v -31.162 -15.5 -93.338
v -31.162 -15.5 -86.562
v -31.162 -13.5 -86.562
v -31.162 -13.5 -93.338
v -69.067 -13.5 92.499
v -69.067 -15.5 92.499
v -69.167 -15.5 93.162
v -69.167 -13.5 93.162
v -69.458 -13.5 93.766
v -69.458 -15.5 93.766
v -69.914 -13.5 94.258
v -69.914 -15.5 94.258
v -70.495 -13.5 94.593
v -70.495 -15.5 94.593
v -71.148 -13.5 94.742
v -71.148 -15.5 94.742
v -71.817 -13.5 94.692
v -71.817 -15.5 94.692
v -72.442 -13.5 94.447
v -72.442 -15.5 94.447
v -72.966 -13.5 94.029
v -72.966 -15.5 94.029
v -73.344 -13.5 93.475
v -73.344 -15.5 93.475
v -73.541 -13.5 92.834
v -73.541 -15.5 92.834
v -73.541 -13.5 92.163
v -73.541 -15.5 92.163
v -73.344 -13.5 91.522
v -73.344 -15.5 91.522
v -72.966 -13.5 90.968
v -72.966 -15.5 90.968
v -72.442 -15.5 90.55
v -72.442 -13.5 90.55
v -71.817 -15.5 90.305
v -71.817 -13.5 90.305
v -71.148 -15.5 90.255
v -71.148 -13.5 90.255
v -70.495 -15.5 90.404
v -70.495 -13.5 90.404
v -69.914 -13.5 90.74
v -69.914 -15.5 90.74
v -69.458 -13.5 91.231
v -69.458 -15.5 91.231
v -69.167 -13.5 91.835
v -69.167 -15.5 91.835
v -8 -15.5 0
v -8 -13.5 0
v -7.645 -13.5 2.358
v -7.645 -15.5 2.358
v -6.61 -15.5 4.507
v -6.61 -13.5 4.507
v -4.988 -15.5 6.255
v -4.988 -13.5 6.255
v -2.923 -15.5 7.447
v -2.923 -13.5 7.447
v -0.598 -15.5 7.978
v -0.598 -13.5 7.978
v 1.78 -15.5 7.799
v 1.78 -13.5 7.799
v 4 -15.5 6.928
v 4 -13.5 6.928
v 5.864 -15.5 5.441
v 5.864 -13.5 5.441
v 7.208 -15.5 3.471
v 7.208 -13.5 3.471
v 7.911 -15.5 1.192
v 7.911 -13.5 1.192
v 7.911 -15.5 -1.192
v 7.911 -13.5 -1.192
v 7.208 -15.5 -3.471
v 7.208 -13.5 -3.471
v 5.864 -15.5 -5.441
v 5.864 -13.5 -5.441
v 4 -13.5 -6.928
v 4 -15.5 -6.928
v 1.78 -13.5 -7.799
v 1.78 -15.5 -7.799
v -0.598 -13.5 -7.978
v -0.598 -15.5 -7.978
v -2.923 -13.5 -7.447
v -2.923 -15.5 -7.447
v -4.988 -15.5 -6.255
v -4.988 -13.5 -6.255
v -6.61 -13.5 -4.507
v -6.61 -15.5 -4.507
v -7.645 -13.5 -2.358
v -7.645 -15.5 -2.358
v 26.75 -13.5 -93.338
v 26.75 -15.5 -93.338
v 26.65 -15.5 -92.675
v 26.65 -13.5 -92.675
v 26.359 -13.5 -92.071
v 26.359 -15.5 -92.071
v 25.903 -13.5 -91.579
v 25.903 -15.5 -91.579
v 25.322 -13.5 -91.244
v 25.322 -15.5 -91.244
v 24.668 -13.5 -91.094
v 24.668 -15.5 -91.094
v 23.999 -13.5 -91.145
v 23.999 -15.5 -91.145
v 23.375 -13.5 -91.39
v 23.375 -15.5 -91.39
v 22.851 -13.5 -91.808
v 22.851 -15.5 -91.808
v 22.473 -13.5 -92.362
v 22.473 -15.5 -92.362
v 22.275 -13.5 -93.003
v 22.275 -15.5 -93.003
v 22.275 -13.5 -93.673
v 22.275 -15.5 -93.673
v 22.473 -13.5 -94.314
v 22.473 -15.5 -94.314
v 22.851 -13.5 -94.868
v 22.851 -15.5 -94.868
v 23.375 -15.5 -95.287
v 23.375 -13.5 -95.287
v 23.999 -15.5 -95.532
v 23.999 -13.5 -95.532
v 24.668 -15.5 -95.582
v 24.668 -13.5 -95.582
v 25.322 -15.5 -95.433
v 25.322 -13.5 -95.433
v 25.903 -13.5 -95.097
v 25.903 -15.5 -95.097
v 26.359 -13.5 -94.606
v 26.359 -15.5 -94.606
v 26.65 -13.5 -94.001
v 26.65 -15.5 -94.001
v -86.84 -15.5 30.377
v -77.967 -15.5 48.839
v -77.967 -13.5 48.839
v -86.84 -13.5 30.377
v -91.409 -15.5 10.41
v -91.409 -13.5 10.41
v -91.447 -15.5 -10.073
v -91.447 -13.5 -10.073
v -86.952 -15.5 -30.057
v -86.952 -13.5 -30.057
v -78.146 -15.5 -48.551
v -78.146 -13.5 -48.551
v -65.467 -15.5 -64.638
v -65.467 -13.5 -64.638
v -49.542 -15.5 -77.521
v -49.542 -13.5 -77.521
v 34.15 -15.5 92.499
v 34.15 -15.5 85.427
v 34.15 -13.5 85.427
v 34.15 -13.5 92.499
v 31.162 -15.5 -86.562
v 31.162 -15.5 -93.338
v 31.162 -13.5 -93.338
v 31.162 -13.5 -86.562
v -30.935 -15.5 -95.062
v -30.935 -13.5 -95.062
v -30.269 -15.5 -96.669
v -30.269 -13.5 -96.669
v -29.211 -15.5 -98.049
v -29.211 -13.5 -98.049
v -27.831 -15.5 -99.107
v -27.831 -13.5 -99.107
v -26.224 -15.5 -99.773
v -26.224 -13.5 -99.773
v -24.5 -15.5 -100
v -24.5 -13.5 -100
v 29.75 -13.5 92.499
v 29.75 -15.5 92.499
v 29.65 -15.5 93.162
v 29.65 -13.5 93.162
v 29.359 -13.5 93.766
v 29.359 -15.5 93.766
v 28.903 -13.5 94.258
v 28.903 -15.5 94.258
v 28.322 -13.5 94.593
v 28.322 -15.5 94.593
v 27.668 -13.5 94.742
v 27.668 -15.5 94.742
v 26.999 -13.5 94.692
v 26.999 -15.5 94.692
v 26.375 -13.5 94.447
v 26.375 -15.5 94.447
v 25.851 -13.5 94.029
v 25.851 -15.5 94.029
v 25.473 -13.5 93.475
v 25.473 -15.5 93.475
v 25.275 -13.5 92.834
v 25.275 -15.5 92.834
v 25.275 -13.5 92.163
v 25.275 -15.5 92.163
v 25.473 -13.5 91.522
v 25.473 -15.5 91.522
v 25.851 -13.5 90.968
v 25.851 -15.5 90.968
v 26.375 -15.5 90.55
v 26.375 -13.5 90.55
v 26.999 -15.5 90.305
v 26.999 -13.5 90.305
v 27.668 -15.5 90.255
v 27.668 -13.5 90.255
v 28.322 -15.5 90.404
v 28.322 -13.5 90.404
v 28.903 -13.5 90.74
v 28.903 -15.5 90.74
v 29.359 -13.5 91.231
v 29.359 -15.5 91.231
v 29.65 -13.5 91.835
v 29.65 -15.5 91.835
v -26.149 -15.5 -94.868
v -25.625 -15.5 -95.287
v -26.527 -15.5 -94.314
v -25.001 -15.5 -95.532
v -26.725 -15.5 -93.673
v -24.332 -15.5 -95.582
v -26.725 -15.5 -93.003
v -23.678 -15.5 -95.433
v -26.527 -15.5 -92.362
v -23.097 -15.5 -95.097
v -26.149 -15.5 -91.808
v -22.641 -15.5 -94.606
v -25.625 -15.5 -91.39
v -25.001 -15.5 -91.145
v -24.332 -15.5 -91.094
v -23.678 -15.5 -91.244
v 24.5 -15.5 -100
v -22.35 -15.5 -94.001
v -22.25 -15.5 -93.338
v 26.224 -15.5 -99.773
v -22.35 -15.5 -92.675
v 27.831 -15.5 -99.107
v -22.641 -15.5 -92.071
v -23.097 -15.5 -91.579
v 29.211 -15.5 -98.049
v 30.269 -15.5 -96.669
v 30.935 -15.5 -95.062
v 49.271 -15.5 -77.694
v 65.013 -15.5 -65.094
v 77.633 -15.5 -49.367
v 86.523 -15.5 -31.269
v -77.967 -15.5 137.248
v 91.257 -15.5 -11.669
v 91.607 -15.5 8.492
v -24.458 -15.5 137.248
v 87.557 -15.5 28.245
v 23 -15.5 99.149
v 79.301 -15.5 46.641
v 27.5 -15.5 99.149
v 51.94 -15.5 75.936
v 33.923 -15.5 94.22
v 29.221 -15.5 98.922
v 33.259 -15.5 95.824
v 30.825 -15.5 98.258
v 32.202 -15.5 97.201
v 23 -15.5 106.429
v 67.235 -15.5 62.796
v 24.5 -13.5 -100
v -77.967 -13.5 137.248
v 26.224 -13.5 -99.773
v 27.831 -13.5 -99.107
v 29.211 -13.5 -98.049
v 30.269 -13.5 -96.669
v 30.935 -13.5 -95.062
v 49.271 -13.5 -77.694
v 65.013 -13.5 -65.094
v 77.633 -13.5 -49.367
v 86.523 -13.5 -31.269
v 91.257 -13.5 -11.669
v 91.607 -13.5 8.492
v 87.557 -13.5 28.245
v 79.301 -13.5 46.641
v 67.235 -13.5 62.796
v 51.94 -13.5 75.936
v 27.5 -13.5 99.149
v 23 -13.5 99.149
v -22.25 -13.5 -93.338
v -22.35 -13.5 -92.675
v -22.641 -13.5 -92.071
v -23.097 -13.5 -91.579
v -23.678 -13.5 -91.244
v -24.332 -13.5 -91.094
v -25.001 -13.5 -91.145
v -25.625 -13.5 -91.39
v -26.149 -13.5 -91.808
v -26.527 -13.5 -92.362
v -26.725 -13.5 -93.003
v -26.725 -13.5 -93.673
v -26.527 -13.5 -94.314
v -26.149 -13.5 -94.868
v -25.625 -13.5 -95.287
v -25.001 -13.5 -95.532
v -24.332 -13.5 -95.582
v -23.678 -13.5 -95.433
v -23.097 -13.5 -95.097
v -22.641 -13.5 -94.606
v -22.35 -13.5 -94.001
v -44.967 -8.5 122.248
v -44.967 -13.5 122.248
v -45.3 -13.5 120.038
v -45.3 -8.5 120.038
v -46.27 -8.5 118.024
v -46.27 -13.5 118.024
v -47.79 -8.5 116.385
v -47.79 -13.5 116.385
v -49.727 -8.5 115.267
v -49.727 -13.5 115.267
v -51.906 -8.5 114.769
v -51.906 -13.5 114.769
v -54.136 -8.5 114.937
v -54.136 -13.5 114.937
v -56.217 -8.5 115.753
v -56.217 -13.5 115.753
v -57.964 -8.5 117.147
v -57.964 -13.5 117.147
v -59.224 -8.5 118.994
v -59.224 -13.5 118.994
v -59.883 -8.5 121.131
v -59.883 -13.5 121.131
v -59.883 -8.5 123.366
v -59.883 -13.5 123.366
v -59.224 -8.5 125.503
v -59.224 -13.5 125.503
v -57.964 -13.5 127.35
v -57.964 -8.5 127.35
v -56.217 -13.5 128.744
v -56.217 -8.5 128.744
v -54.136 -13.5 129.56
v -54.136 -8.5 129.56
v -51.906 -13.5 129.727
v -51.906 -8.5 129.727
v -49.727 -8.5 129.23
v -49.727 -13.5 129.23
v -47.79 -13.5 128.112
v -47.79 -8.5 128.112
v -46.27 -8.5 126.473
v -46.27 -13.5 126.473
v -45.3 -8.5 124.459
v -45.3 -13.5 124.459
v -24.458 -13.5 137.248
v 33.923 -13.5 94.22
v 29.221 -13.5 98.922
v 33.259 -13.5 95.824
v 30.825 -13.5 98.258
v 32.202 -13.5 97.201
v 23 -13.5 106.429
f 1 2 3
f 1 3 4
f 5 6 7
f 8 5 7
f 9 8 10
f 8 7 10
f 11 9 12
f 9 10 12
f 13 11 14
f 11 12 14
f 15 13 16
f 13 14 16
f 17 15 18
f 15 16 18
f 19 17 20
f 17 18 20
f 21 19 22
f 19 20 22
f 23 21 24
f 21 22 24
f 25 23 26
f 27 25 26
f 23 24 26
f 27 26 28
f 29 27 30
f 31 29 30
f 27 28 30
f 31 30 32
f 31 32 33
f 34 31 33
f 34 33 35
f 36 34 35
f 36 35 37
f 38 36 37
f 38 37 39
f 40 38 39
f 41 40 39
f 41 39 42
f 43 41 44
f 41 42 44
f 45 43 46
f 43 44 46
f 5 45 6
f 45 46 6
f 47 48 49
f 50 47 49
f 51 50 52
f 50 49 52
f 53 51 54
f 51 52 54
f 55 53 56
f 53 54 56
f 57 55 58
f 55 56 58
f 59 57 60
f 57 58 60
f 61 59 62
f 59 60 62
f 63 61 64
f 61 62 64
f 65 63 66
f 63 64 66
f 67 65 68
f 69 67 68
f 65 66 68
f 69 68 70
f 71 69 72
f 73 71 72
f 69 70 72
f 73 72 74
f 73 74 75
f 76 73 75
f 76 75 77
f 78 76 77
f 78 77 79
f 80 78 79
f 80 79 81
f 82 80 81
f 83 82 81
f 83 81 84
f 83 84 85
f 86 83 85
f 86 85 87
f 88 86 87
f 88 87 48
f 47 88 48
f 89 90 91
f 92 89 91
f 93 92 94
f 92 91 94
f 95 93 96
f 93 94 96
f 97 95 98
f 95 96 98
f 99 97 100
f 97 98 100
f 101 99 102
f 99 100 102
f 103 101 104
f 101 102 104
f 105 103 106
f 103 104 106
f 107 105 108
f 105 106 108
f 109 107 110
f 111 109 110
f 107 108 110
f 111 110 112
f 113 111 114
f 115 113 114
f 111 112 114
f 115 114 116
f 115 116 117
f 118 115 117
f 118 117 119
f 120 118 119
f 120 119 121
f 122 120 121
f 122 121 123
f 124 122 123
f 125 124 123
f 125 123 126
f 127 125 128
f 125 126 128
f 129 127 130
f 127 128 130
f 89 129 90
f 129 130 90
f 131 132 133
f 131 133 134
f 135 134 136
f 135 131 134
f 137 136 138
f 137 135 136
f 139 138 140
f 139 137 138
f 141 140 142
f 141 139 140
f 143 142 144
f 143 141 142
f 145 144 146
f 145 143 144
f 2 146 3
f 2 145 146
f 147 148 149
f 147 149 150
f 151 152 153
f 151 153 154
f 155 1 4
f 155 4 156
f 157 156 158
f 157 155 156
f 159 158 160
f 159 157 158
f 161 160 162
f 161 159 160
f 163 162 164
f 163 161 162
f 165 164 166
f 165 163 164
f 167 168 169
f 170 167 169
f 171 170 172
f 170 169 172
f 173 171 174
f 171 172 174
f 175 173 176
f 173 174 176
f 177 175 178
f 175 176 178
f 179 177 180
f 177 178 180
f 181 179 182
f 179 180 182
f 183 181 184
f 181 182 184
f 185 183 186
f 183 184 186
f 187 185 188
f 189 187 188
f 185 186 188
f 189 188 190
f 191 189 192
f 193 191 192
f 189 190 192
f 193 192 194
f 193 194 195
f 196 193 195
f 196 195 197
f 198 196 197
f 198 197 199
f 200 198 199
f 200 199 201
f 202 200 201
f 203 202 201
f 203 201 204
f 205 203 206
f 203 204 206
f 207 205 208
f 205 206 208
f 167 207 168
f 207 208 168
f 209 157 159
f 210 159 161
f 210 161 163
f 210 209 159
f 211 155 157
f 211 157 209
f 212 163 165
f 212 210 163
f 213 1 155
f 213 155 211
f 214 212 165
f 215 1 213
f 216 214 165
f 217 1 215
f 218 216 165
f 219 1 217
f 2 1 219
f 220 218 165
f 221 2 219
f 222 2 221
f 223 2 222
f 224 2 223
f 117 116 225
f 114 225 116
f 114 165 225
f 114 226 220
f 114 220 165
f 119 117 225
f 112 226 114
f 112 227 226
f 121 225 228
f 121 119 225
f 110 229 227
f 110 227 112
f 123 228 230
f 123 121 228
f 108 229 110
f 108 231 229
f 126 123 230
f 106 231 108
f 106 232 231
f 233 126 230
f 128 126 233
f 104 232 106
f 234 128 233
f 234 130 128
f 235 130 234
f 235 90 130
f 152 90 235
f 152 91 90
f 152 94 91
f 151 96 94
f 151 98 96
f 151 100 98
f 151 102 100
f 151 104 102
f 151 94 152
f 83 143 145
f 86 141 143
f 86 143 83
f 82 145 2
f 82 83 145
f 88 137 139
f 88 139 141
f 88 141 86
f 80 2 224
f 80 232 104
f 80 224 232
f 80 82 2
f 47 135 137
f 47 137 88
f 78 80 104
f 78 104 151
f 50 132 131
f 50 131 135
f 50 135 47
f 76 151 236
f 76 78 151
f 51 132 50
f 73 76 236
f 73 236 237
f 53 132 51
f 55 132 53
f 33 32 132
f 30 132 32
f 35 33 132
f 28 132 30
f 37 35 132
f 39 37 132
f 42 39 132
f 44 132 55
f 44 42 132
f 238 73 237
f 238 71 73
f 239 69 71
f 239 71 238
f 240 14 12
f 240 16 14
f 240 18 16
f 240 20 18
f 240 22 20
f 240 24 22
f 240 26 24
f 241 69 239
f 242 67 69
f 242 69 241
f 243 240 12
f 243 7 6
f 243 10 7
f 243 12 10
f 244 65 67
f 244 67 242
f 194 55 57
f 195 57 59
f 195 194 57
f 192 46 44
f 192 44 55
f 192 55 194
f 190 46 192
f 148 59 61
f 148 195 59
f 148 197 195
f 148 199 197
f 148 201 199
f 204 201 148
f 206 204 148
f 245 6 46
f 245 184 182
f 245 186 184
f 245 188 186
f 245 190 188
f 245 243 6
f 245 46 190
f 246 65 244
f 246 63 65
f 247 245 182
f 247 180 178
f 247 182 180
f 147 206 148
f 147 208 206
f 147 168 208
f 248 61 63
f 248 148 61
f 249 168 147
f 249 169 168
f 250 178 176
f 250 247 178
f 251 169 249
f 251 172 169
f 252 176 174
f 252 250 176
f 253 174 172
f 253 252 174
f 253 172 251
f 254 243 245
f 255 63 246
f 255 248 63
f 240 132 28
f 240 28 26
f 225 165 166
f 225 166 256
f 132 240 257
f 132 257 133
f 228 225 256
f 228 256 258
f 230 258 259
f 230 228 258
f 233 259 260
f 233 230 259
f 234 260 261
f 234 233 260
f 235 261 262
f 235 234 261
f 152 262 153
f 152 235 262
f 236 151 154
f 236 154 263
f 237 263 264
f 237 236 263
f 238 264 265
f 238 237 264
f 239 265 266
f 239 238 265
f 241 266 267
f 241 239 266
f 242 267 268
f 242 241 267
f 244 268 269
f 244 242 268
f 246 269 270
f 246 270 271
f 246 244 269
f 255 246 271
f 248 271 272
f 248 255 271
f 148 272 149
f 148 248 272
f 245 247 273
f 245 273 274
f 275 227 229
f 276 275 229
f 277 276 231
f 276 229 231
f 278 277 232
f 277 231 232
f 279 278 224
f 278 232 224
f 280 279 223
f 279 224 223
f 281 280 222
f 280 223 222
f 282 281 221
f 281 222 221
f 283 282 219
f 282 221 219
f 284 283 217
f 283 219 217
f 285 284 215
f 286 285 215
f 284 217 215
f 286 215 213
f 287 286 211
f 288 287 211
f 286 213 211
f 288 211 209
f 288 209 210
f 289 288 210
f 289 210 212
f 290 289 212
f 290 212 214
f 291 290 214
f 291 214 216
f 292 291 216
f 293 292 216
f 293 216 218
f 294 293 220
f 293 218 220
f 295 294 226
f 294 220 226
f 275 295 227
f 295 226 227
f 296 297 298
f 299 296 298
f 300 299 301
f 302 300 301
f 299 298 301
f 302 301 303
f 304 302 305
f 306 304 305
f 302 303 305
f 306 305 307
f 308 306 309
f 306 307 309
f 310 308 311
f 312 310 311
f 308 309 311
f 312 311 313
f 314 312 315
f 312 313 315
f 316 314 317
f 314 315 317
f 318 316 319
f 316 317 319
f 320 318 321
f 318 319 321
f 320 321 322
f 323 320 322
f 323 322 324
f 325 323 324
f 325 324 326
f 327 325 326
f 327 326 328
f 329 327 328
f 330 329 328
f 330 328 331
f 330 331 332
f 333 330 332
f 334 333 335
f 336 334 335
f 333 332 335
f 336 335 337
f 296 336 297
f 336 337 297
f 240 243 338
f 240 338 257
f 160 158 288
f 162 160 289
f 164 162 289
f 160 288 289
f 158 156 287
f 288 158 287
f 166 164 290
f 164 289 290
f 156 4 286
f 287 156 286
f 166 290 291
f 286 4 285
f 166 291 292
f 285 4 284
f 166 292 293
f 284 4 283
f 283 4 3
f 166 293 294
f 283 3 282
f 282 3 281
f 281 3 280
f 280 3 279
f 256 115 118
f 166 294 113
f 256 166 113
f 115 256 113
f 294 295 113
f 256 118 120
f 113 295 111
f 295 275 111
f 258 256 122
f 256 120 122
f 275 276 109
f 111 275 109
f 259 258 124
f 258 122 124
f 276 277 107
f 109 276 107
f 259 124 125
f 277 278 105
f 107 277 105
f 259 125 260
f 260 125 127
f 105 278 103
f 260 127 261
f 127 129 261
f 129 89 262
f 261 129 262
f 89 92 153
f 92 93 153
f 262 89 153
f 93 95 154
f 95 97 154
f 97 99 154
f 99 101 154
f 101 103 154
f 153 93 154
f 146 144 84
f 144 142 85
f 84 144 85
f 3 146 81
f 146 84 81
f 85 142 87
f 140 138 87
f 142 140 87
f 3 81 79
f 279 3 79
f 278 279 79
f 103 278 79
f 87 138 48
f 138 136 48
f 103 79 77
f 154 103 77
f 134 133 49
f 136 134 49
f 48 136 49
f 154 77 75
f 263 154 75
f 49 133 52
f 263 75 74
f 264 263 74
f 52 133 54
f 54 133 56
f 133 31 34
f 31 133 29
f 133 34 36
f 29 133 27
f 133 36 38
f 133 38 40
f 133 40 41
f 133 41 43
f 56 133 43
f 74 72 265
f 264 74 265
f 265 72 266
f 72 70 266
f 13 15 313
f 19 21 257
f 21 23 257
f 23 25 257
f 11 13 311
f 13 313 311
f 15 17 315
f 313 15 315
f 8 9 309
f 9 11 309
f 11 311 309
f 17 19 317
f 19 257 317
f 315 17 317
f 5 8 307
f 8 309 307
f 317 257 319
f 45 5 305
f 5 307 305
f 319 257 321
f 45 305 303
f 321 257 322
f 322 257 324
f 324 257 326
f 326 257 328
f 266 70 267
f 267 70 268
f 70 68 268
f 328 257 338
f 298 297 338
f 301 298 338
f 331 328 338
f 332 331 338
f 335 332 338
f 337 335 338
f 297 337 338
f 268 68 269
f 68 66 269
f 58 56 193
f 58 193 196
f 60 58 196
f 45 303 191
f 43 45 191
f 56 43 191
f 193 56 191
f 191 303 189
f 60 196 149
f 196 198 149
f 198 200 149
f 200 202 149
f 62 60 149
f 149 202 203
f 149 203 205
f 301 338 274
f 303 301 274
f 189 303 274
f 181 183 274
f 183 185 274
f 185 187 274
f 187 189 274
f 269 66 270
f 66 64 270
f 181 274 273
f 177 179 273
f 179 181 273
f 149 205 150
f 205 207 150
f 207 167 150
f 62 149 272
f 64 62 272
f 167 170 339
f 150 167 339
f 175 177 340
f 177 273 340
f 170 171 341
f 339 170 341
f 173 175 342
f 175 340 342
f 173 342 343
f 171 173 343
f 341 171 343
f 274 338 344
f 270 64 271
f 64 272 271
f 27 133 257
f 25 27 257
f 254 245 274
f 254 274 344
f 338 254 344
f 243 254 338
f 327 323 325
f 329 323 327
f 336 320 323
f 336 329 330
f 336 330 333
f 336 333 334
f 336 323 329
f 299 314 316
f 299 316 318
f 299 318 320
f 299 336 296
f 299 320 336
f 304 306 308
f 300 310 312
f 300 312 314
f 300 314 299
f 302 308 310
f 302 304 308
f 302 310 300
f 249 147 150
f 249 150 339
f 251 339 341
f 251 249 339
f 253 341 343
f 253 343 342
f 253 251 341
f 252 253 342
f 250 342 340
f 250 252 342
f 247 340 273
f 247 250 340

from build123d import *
from build123d.topology import SkipClean

# Parameters (mm, degrees)
SALIENTE_EXTRUIR1_DEPTH                   = 12.5
SALIENTE_EXTRUIR1_2_DEPTH                 = 12.5
CROQUIS4_R                                = 92
CROQUIS4_R_2                              = 17.5
SALIENTE_EXTRUIR3_DEPTH                   = 3
CROQUIS5_W                                = 42.3
CROQUIS5_H                                = 42.3
CROQUIS5_R                                = 19
CROQUIS5_R_2                              = 1.5
SALIENTE_EXTRUIR4_DEPTH                   = 10
CHAFL_N1_SIZE                             = 4
CROQUIS7_W                                = 46.3
CROQUIS7_H                                = 3
SALIENTE_EXTRUIR5_DEPTH                   = 70
SALIENTE_EXTRUIR7_START                   = -3.5
SALIENTE_EXTRUIR7_DEPTH                   = 7
CROQUIS15_W                               = 46.3
CROQUIS15_H                               = 2
SALIENTE_EXTRUIR8_DEPTH                   = 42.3
SALIENTE_EXTRUIR9_START                   = 21.15
SALIENTE_EXTRUIR9_DEPTH                   = 2
SALIENTE_EXTRUIR10_START                  = -15.5
SALIENTE_EXTRUIR10_DEPTH                  = 6
SALIENTE_EXTRUIR10_START_2                = -9.5
SALIENTE_EXTRUIR10_2_DEPTH                = 22
CROQUIS20_R                               = 2
SALIENTE_EXTRUIR11_DEPTH                  = 28
CORTAR_EXTRUIR2_DEPTH                     = 3.3
SALIENTE_EXTRUIR30_DEPTH                  = 3
SALIENTE_EXTRUIR27_REACH                  = 245.062
SALIENTE_EXTRUIR27_END_RADIUS             = 92
CROQUIS60_W                               = 3
CROQUIS60_H                               = 28
SALIENTE_EXTRUIR27_DIRECTION_2_REACH      = 245.062
SALIENTE_EXTRUIR28_START                  = 89.078617
CROQUIS61_W                               = 3
CROQUIS61_H                               = 28
SALIENTE_EXTRUIR28_DEPTH                  = 15.72116
SALIENTE_EXTRUIR32_DEPTH                  = 3
SALIENTE_EXTRUIR33_DEPTH                  = 3
SALIENTE_EXTRUIR34_DEPTH                  = 25
REDONDEO9_R                               = 5
REDONDEO10_R                              = 4
CORTAR_EXTRUIR6_OUTLINE_W                 = 2.65
CORTAR_EXTRUIR6_OUTLINE_H                 = 6.147817537
CROQUIS32_R                               = 3.65
CROQUIS32_R_2                             = 2.65
SALIENTE_EXTRUIR16_DEPTH                  = 5.5
SALIENTE_EXTRUIR16_DIRECTION_2_REACH      = 234.007
SALIENTE_EXTRUIR16_DIRECTION_2_END_RADIUS = 92
CORTAR_EXTRUIR21_OUTLINE_W                = 2.65
CORTAR_EXTRUIR21_OUTLINE_H                = 6.147460621
CROQUIS70_R                               = 3.65
CROQUIS70_R_2                             = 2.65
SALIENTE_EXTRUIR36_DEPTH                  = 5.5
SALIENTE_EXTRUIR36_DIRECTION_2_REACH      = 241.136
SALIENTE_EXTRUIR36_DIRECTION_2_END_RADIUS = 92
CROQUIS35_R                               = 3.5
CORTAR_EXTRUIR8_DEPTH                     = 3
CROQUIS37_R                               = 6
CROQUIS37_R_2                             = 2
SALIENTE_EXTRUIR18_DEPTH                  = 3
CORTAR_EXTRUIR10_DEPTH                    = 3
CORTAR_EXTRUIR10_DEPTH_BACK               = 3
CROQUIS41_R                               = 3.5
CROQUIS44_R                               = 5
CORTAR_EXTRUIR12_DEPTH                    = 3
CROQUIS42_R                               = 6
CROQUIS42_R_2                             = 2
SALIENTE_EXTRUIR20_DEPTH                  = 3.3
CORTAR_EXTRUIR14_REACH                    = 189.797
SALIENTE_EXTRUIR22_DEPTH                  = 3.3
SALIENTE_EXTRUIR23_DEPTH                  = 5
CORTAR_EXTRUIR15_DEPTH                    = 3.3
SIMETR_A11_START                          = -18.8
SIMETR_A11_DEPTH                          = 3.3
SIMETR_A11_START_2                        = -23.8
SIMETR_A11_2_DEPTH                        = 5
SIMETR_A11_START_3                        = -20.5
SIMETR_A11_3_DEPTH                        = 1.7
SALIENTE_EXTRUIR24_DEPTH                  = 3.3
CROQUIS53_R                               = 8
SALIENTE_EXTRUIR25_DEPTH                  = 5
CORTAR_EXTRUIR16_DEPTH                    = 3.3
CROQUIS55_R                               = 2
CORTAR_EXTRUIR18_DEPTH                    = 181.493683415
CORTAR_EXTRUIR19_REACH                    = 228.145
CORTAR_EXTRUIR19_END_RADIUS               = 89
CROQUIS56_W                               = 15
CROQUIS56_H                               = 10
CROQUIS69_R                               = 2
SALIENTE_EXTRUIR35_DEPTH                  = 28
SALIENTE_EXTRUIR37_DEPTH                  = 28
SALIENTE_EXTRUIR38_DEPTH                  = 2
SALIENTE_EXTRUIR39_START                  = -2
SALIENTE_EXTRUIR39_DEPTH                  = 2
SALIENTE_EXTRUIR40_DEPTH                  = 26
CROQUIS74_R                               = 2
CORTAR_EXTRUIR22_DEPTH                    = 170.285734049
CORTAR_EXTRUIR23_DEPTH                    = 3.3
CROQUIS79_R                               = 2.25
SALIENTE_EXTRUIR41_DEPTH                  = 2
CROQUIS81_R                               = 7.5
SALIENTE_EXTRUIR43_DEPTH                  = 5
CROQUIS82_R                               = 8
CORTAR_EXTRUIR24_DEPTH                    = 10


# Read off the part's stored shape, not the designer's step: Saliente-Extruir7, Saliente-Extruir9, Saliente-Extruir10, Cortar-Extruir6, Cortar-Extruir21, Simetría11
with BuildPart() as part:
    # Croquis1 → Saliente-Extruir1 (new, symmetric)
    with BuildSketch(Plane(origin=(0, 0, 0), x_dir=(1, 0, 0), z_dir=(0, 1, 0))):
        with BuildLine():
            Line((-17, 87.361318671), (-17, 90.4157066))
            ThreePointArc((-17, 90.4157066), (-90.786182549, 14.895269658), (-45, -80.243379789))
            Line((-45, -80.243379789), (-45, -76.785415282))
            ThreePointArc((-45, -76.785415282), (-87.732762221, 14.965374473), (-17, 87.361318671))
        make_face()
    extrude(amount=SALIENTE_EXTRUIR1_DEPTH, both=True)



with BuildPart() as body_2:
    # Croquis1 → Saliente-Extruir1 2 (new, symmetric)
    with BuildSketch(Plane(origin=(0, 0, 0), x_dir=(1, 0, 0), z_dir=(0, 1, 0))):
        with BuildLine():
            ThreePointArc((20, -89.799777283), (91.987255409, 1.531287769), (17, 90.4157066))
            Line((17, 90.4157066), (17, 87.361318671))
            ThreePointArc((17, 87.361318671), (88.986787561, 1.533505674), (20, -86.723699183))
            Line((20, -86.723699183), (20, -89.799777283))
        make_face()
    extrude(amount=SALIENTE_EXTRUIR1_2_DEPTH, both=True)


with BuildPart() as body_3:
    # Croquis4 → Saliente-Extruir3 (new body)
    with BuildSketch(Plane.XZ.offset(12.5)):
        with Locations(Location((0, 0, 0), (0, 0, 270))):
            Circle(CROQUIS4_R)
        with Locations(Location((0, 0, 0), (0, 0, 270))):
            Circle(CROQUIS4_R_2, mode=Mode.SUBTRACT)
    extrude(amount=SALIENTE_EXTRUIR3_DEPTH)


with BuildPart() as body_4:
    # Croquis5 → Saliente-Extruir4 (new body)
    with BuildSketch(Plane(origin=(0, -15.5, 0), x_dir=(-1, 0, 0), z_dir=(0, -1, 0))):
        Rectangle(CROQUIS5_W, CROQUIS5_H)
        with Locations(Location((0, 0, 0), (0, 0, 90))):
            Circle(CROQUIS5_R, mode=Mode.SUBTRACT)
        with Locations(Location((-15.5, -15.5, 0), (0, 0, 90))):
            Circle(CROQUIS5_R_2, mode=Mode.SUBTRACT)
        with Locations(Location((15.5, -15.5, 0), (0, 0, 270))):
            Circle(CROQUIS5_R_2, mode=Mode.SUBTRACT)
        with Locations(Location((-15.5, 15.5, 0), (0, 0, 270))):
            Circle(CROQUIS5_R_2, mode=Mode.SUBTRACT)
        with Locations(Location((15.5, 15.5, 0), (0, 0, 90))):
            Circle(CROQUIS5_R_2, mode=Mode.SUBTRACT)
    extrude(amount=SALIENTE_EXTRUIR4_DEPTH)

    # Chaflán1
    chafl_n1_edges = [body_4.edges().sort_by_distance(p)[0] for p in [
        (-21.15, -20.5, 21.15),
        (21.15, -20.5, 21.15),
        (21.15, -20.5, -21.15),
        (-21.15, -20.5, -21.15),
    ]]
    chamfer(chafl_n1_edges, length=CHAFL_N1_SIZE)


with BuildPart() as body_4_2:
    # Croquis7 → Saliente-Extruir5 (new body)
    with BuildSketch(Plane.XZ.offset(15.5)):
        with Locations((0, 22.65)):
            Rectangle(CROQUIS7_W, CROQUIS7_H)
    extrude(amount=SALIENTE_EXTRUIR5_DEPTH)


with BuildPart() as body_5:
    # Saliente-Extruir7 outline → Saliente-Extruir7 (new body)
    with BuildSketch(Plane.YZ.offset(SALIENTE_EXTRUIR7_START)):
        Polygon((-15.5, 73.164527675), (-85.5, 24.15), (-15.5, 24.15), align=None)
    extrude(amount=SALIENTE_EXTRUIR7_DEPTH)

    # Croquis44 → Cortar-Extruir12 (cut)
    with BuildSketch(Plane.XZ.offset(15.5)):
        with Locations((0, 73.164527675)):
            Circle(CROQUIS44_R)
    extrude(amount=CORTAR_EXTRUIR12_DEPTH, mode=Mode.SUBTRACT)

    # Croquis42 → Saliente-Extruir20 (add)
    with BuildSketch(Plane.XZ.offset(15.5)):
        with Locations((0, 73.164527675)):
            Circle(CROQUIS42_R)
        with Locations((0, 73.164527675)):
            Circle(CROQUIS42_R_2, mode=Mode.SUBTRACT)
    extrude(amount=SALIENTE_EXTRUIR20_DEPTH)

    # Cortar-Extruir14: up to this face of the body (flat: up to its plane)
    cortar_extruir14_end = Plane(body_5.part.faces().sort_by_distance((-3.5, -38.990764188, 40.274069561))[0])
    # Croquis45 → Cortar-Extruir14 (cut, up to the picked face)
    with BuildSketch(Plane(origin=(3.5, 0, 0), x_dir=(0, 0, -1), z_dir=(1, 0, 0)), mode=Mode.PRIVATE) as cortar_extruir14_sk1:
        Polygon((-70.853842799, -18.95), (-68.141130502, -18.95), (-68.141130502, -15.5), (-68.291130502, -15.5), (-68.291130502, -18.8), (-70.853842799, -18.8), align=None)
    cortar_extruir14_tool1 = split(extrude(cortar_extruir14_sk1.sketch, amount=-CORTAR_EXTRUIR14_REACH, mode=Mode.PRIVATE), bisect_by=cortar_extruir14_end, keep=Keep.BOTH, mode=Mode.PRIVATE)
    add(cortar_extruir14_tool1.solids().sort_by(Axis((3.5, -18.906112, 69.497487), (-1, 0, 0)))[0], mode=Mode.SUBTRACT)


with BuildPart() as body_6:
    # Croquis15 → Saliente-Extruir8 (new body)
    with BuildSketch(Plane(origin=(0, 0, 21.15), x_dir=(-1, 0, 0), z_dir=(0, 0, -1))):
        with Locations((0, -84.5)):
            Rectangle(CROQUIS15_W, CROQUIS15_H)
    extrude(amount=SALIENTE_EXTRUIR8_DEPTH)


with BuildPart() as body_7:
    # Saliente-Extruir9 outline → Saliente-Extruir9 (new body)
    with BuildSketch(Plane.YZ.offset(SALIENTE_EXTRUIR9_START)):
        Polygon((-53.5, 21.15), (-83.5, 21.15), (-83.5, -8.85), align=None)
    extrude(amount=SALIENTE_EXTRUIR9_DEPTH)


with BuildPart() as body_8:
    # Simetría10: mirrored copy
    add(body_7.part.mirror(Plane(origin=(0, 0, 0), x_dir=(0, 0, 1), z_dir=(1, 0, 0))))


with BuildPart() as part_1:
    add(part.part)

    add(body_2.part)  # Saliente-Extruir10 merges body 2

    add(body_3.part)  # Saliente-Extruir10 merges body 3
    # Saliente-Extruir10 outline → Saliente-Extruir10 (add)
    with BuildSketch(Plane(origin=(0, 0, 0), x_dir=(1, 0, 0), z_dir=(0, 1, 0)).offset(SALIENTE_EXTRUIR10_START)):
        with BuildLine():
            Line((-20, 100), (-20, 89.799777282))
            ThreePointArc((-20, 89.799777282), (-18.502563126, 90.12022613), (-17, 90.4157066))
            ThreePointArc((-17, 90.4157066), (0, 92), (17, 90.4157066))
            ThreePointArc((17, 90.4157066), (18.502563126, 90.12022613), (20, 89.799777283))
            Line((20, 89.799777283), (20, 100))
            Line((20, 100), (-20, 100))
        make_face()
    extrude(amount=SALIENTE_EXTRUIR10_DEPTH)

    # Saliente-Extruir10 2 outline → Saliente-Extruir10 2 (add)
    with SkipClean():  # the faces are left unmerged after this step: merging them gives an invalid solid
        with BuildSketch(Plane(origin=(0, 0, 0), x_dir=(1, 0, 0), z_dir=(0, 1, 0)).offset(SALIENTE_EXTRUIR10_START_2)):
            with BuildLine():
                ThreePointArc((-20, 89.799777282), (-18.502563126, 90.12022613), (-17, 90.4157066))
                Line((-17, 90.4157066), (-17, 100))
                Line((-17, 100), (-20, 100))
                Line((-20, 100), (-20, 89.799777282))
            make_face()
            with BuildLine():
                Line((17, 100), (17, 90.4157066))
                ThreePointArc((17, 90.4157066), (18.502563126, 90.12022613), (20, 89.799777283))
                Line((20, 89.799777283), (20, 100))
                Line((20, 100), (17, 100))
            make_face()
        extrude(amount=SALIENTE_EXTRUIR10_2_DEPTH)

    # Croquis20 → Saliente-Extruir11 (add)
    with SkipClean():  # the faces are left unmerged after this step: merging them gives an invalid solid
        with BuildSketch(Plane(origin=(0, 12.5, 0), x_dir=(1, 0, 0), z_dir=(0, 1, 0))):
            with BuildLine():
                Line((-20, 100), (-24.5, 100))
                ThreePointArc((-24.5, 100), (-29.210678119, 98.048773235), (-31.161904883, 93.338095117))
                Line((-31.161904883, 93.338095117), (-31.161904883, 86.561744923))
                ThreePointArc((-31.161904883, 86.561744923), (-25.632134933, 88.357193588), (-20, 89.799777283))
                Line((-20, 89.799777283), (-20, 100))
            make_face()
            with Locations(Location((-24.5, 93.338095117, 0), (0, 0, 270))):
                Circle(CROQUIS20_R, mode=Mode.SUBTRACT)
        saliente_extruir11 = extrude(amount=-SALIENTE_EXTRUIR11_DEPTH)

    # Simetría2: Saliente-Extruir11 across plane
    with SkipClean():  # the faces are left unmerged after this step: merging them gives an invalid solid
        add(saliente_extruir11.mirror(Plane(origin=(0, 0, 0), x_dir=(0, 0, 1), z_dir=(1, 0, 0))))

    # Croquis22 → Cortar-Extruir2 (cut)
    with SkipClean():  # the faces are left unmerged after this step: merging them gives an invalid solid
        with BuildSketch(Plane.XZ.offset(15.5)):
            Polygon((22.479274058, -89.838095117), (26.520725942, -89.838095117), (28.541451884, -93.338095117), (26.520725942, -96.838095117), (22.479274058, -96.838095117), (20.458548116, -93.338095117), align=None)
            Polygon((-26.520725942, -89.838095117), (-28.541451884, -93.338095117), (-26.520725942, -96.838095117), (-22.479274058, -96.838095117), (-20.458548116, -93.338095117), (-22.479274058, -89.838095117), align=None)
        extrude(amount=-CORTAR_EXTRUIR2_DEPTH, mode=Mode.SUBTRACT)

    # Croquis65 → Saliente-Extruir30 (add)
    with BuildSketch(Plane(origin=(0, -12.5, 0), x_dir=(1, 0, 0), z_dir=(0, 1, 0))):
        with BuildLine():
            Line((-45, -80.243379789), (-73.381594056, -104.799777283))
            Line((-73.381594056, -104.799777283), (20, -104.799777283))
            Line((20, -104.799777283), (20, -89.799777283))
            ThreePointArc((20, -89.799777283), (-13.382121777, -91.021529413), (-45, -80.243379789))
        make_face()
    extrude(amount=-SALIENTE_EXTRUIR30_DEPTH)

    # Saliente-Extruir27: up to this cylinder (the profile starts outside it)
    saliente_extruir27_end = Plane(origin=(0, -1.5, 0), z_dir=(0, -1, 0)) * Cylinder(SALIENTE_EXTRUIR27_END_RADIUS, 675.124, mode=Mode.PRIVATE)
    # Croquis60 → Saliente-Extruir27 (add, up to the surface)
    with BuildSketch(Plane(origin=(-69.573094964, 0, 60.196216302), x_dir=(-0.6543066989345575, 0, -0.7562292930912968), z_dir=(0.7562292930912968, 0, -0.6543066989345575)), mode=Mode.PRIVATE) as saliente_extruir27_sk1:
        with Locations((-29.738592921, -1.5)):
            Rectangle(CROQUIS60_W, CROQUIS60_H)
    saliente_extruir27_tool1 = extrude(saliente_extruir27_sk1.sketch, amount=SALIENTE_EXTRUIR27_REACH, mode=Mode.PRIVATE) - saliente_extruir27_end
    add(saliente_extruir27_tool1.solids().sort_by_distance((-50.114934, -1.5, 82.685411))[0])

    # Saliente-Extruir27 direction 2: up to this plane
    saliente_extruir27_direction_2_end = Plane(origin=(-73.381594056, -112.056401995, 104.799777283), z_dir=(0, 0, 1))
    # Croquis60 → Saliente-Extruir27 direction 2 (add, up to the surface)
    with BuildSketch(Plane(origin=(-69.573094964, 0, 60.196216302), x_dir=(-0.6543066989345575, 0, -0.7562292930912968), z_dir=(0.7562292930912968, 0, -0.6543066989345575)), mode=Mode.PRIVATE) as saliente_extruir27_direction_2_sk1:
        with Locations((-29.738592921, -1.5)):
            Rectangle(CROQUIS60_W, CROQUIS60_H)
    saliente_extruir27_direction_2_tool1 = split(extrude(saliente_extruir27_direction_2_sk1.sketch, amount=-SALIENTE_EXTRUIR27_DIRECTION_2_REACH, mode=Mode.PRIVATE), bisect_by=saliente_extruir27_direction_2_end, keep=Keep.BOTH, mode=Mode.PRIVATE)
    add(saliente_extruir27_direction_2_tool1.solids().sort_by_distance((-50.114934, -1.5, 82.685411))[0])

    # Croquis61 → Saliente-Extruir28 (add)
    with BuildSketch(Plane.XY.offset(SALIENTE_EXTRUIR28_START)):
        with Locations((21.5, -1.5)):
            Rectangle(CROQUIS61_W, CROQUIS61_H)
    extrude(amount=SALIENTE_EXTRUIR28_DEPTH)

    # Croquis66 → Saliente-Extruir32 (add)
    with BuildSketch(Plane(origin=(0, -12.5, 0), x_dir=(1, 0, 0), z_dir=(0, 1, 0))):
        Polygon((-74.966599841, -104.799777283), (-74.966599841, -119.799777283), (-3.097974457, -119.799777283), (20, -104.799777283), align=None)
    extrude(amount=-SALIENTE_EXTRUIR32_DEPTH)

    # Croquis67 → Saliente-Extruir33 (add)
    with BuildSketch(Plane(origin=(0, -12.5, 0), x_dir=(1, 0, 0), z_dir=(0, 1, 0))):
        Polygon((20, -104.799777283), (23, -104.799777283), (23, -106.428644381), (-24.458364465, -137.248466626), (-29.966599841, -137.248466626), (-77.966599841, -137.248466626), (-77.966599841, -104.799777283), (-74.966599841, -104.799777283), (-74.966599841, -119.799777283), (-3.097974457, -119.799777283), align=None)
    extrude(amount=-SALIENTE_EXTRUIR33_DEPTH)

    # Croquis68 → Saliente-Extruir34 (add)
    with BuildSketch(Plane(origin=(0, -12.5, 0), x_dir=(1, 0, 0), z_dir=(0, 1, 0))):
        Polygon((-74.966599841, -106.171160159), (-74.966599841, -137.248466626), (-77.966599841, -137.248466626), (-77.966599841, -104.799777283), (-73.381594056, -104.799777283), align=None)
        Polygon((20, -104.799777283), (-29.966599841, -137.248466626), (-24.458364465, -137.248466626), (23, -106.428644381), (23, -104.799777283), align=None)
    extrude(amount=SALIENTE_EXTRUIR34_DEPTH)

    # Redondeo9
    # the kernel refuses this fillet: 5 mm, written as the material it takes off along each edge
    with BuildSketch(Plane(origin=(-45, -12.5, 80.243379789), x_dir=(0, 0, -1), z_dir=(0, 1, 0))) as redondeo9_piece_1:
        with BuildLine():
            CenterArc((REDONDEO9_R * 0.457127625475, REDONDEO9_R), REDONDEO9_R, 220.867101081, 49.132898919)
            Line((-REDONDEO9_R * 0.299101667616, REDONDEO9_R * 0.345693301065), (0, 0))
            Line((0, 0), (REDONDEO9_R * 0.457127625475, 0))
        make_face()
    extrude(amount=30.714095318, mode=Mode.SUBTRACT)
    with BuildSketch(Plane(origin=(-45, 19.533949217, 76.785415282), x_dir=(-0.8548787678181875, 0, -0.518827806052892), z_dir=(0, -1, 0))) as redondeo9_piece_2:
        with BuildLine():
            CenterArc((2.814630463, -4.999408566), REDONDEO9_R, 90.88127216, 57.865071996)
            Line((-1.459763376, -2.405269536), (0, 0))
            ThreePointArc((0, 0), (1.368863996, -0.010527525), (2.737727991, 0))
        make_face()
    extrude(amount=32.033949217, mode=Mode.SUBTRACT)

    # Redondeo10
    redondeo10_edges = [part_1.edges().sort_by_distance(p)[0] for p in [
        (20, 0, 86.723699183),
    ]]
    fillet(redondeo10_edges, radius=REDONDEO10_R)

    # Cortar-Extruir6 outline → Cortar-Extruir6 (revolve, cut)
    with BuildSketch(Plane(origin=(7.255228308, 0, 41.146444401), x_dir=(0, 1, 0), z_dir=(-0.17364817766693907, 0, -0.9848077530122066))):
        with Locations((1.325, 80.189494924)):
            Rectangle(CORTAR_EXTRUIR6_OUTLINE_W, CORTAR_EXTRUIR6_OUTLINE_H)
    revolve(axis=Axis((7.255228308, 0, 41.146444401), (0.9848077530122066, 0, -0.17364817766693907)), mode=Mode.SUBTRACT)

    # Croquis32 → Saliente-Extruir16 (add)
    with BuildSketch(Plane(origin=(87.975419613, -12.5, 26.913296786), x_dir=(-0.17364817766693919, 0, -0.9848077530122067), z_dir=(0.9848077530122067, 0, -0.17364817766693919))):
        with Locations((0, 12.5)):
            Circle(CROQUIS32_R)
        with Locations((0, 12.5)):
            Circle(CROQUIS32_R_2, mode=Mode.SUBTRACT)
    extrude(amount=SALIENTE_EXTRUIR16_DEPTH)

    # Saliente-Extruir16 direction 2: up to this cylinder (the profile starts outside it)
    saliente_extruir16_direction_2_end = Plane(origin=(0, 0, 0), z_dir=(0, -1, 0)) * Cylinder(SALIENTE_EXTRUIR16_DIRECTION_2_END_RADIUS, 653.014, mode=Mode.PRIVATE)
    # Croquis32 → Saliente-Extruir16 direction 2 (add, up to the surface)
    with BuildSketch(Plane(origin=(87.975419613, -12.5, 26.913296786), x_dir=(-0.17364817766693919, 0, -0.9848077530122067), z_dir=(0.9848077530122067, 0, -0.17364817766693919)), mode=Mode.PRIVATE) as saliente_extruir16_direction_2_sk1:
        with Locations((0, 12.5)):
            Circle(CROQUIS32_R)
        with Locations((0, 12.5)):
            Circle(CROQUIS32_R_2, mode=Mode.SUBTRACT)
    saliente_extruir16_direction_2_tool1 = extrude(saliente_extruir16_direction_2_sk1.sketch, amount=-SALIENTE_EXTRUIR16_DIRECTION_2_REACH, mode=Mode.PRIVATE) - saliente_extruir16_direction_2_end
    add(saliente_extruir16_direction_2_tool1.solids().sort_by_distance((88.591308, 0, 30.406176))[0])

    # Cortar-Extruir21 outline → Cortar-Extruir21 (revolve, cut)
    with BuildSketch(Plane(origin=(39.261480281, 0, -14.290010176), x_dir=(0.9396926207859093, 0, -0.3420201433256662), z_dir=(0, -1, 0))):
        with Locations((1.325, 80.189673382)):
            Rectangle(CORTAR_EXTRUIR21_OUTLINE_W, CORTAR_EXTRUIR21_OUTLINE_H)
    revolve(axis=Axis((39.261480281, 0, -14.290010176), (0.3420201433256662, 0, 0.9396926207859093)), mode=Mode.SUBTRACT)

    # Croquis70 → Saliente-Extruir36 (add)
    with BuildSketch(Plane(origin=(67.295308523, -12.5, 62.7322999), x_dir=(0.9396926207859095, 0, -0.3420201433256657), z_dir=(0.3420201433256657, 0, 0.9396926207859095))):
        with Locations((0, 12.5)):
            Circle(CROQUIS70_R)
        with Locations((0, 12.5)):
            Circle(CROQUIS70_R_2, mode=Mode.SUBTRACT)
    extrude(amount=SALIENTE_EXTRUIR36_DEPTH)

    # Saliente-Extruir36 direction 2: up to this cylinder (the profile starts outside it)
    with SkipClean():  # the faces are left unmerged after this step: merging them gives an invalid solid
        saliente_extruir36_direction_2_end = Plane(origin=(0, 0, 0), z_dir=(0, -1, 0)) * Cylinder(SALIENTE_EXTRUIR36_DIRECTION_2_END_RADIUS, 667.272, mode=Mode.PRIVATE)
        # Croquis70 → Saliente-Extruir36 direction 2 (add, up to the surface)
        with BuildSketch(Plane(origin=(67.295308523, -12.5, 62.7322999), x_dir=(0.9396926207859095, 0, -0.3420201433256657), z_dir=(0.3420201433256657, 0, 0.9396926207859095)), mode=Mode.PRIVATE) as saliente_extruir36_direction_2_sk1:
            with Locations((0, 12.5)):
                Circle(CROQUIS70_R)
            with Locations((0, 12.5)):
                Circle(CROQUIS70_R_2, mode=Mode.SUBTRACT)
        saliente_extruir36_direction_2_tool1 = extrude(saliente_extruir36_direction_2_sk1.sketch, amount=-SALIENTE_EXTRUIR36_DIRECTION_2_REACH, mode=Mode.PRIVATE) - saliente_extruir36_direction_2_end
        add(saliente_extruir36_direction_2_tool1.solids().sort_by_distance((63.962442, 0, 63.945364))[0])

    # Croquis35 → Cortar-Extruir8 (cut)
    with BuildSketch(Plane.XZ.offset(15.5)):
        with Locations((-13.15, 30.15)):
            Circle(CROQUIS35_R)
    cortar_extruir8 = extrude(amount=-CORTAR_EXTRUIR8_DEPTH, mode=Mode.SUBTRACT)

    # Simetría3: Cortar-Extruir8 across plane
    add(cortar_extruir8.mirror(Plane(origin=(0, 0, 0), x_dir=(0, 0, 1), z_dir=(1, 0, 0))), mode=Mode.SUBTRACT)

    # Croquis41 → Cortar-Extruir10 (cut, two sides: drawn at the far end of the back side and taken through both)
    with BuildSketch(Plane.XZ.offset(15.5).offset(-CORTAR_EXTRUIR10_DEPTH_BACK)):
        with Locations(Location((0, 73.164527675, 0), (0, 0, 180))):
            Circle(CROQUIS41_R)
    extrude(amount=CORTAR_EXTRUIR10_DEPTH + CORTAR_EXTRUIR10_DEPTH_BACK, mode=Mode.SUBTRACT)

    # Cortar-Extruir19: up to this cylinder (the profile starts outside it)
    cortar_extruir19_end = Plane(origin=(0, 0, 0), z_dir=(0, -1, 0)) * Cylinder(CORTAR_EXTRUIR19_END_RADIUS, 635.29, mode=Mode.PRIVATE)
    # Croquis56 → Cortar-Extruir19 (cut, up to the surface)
    with BuildSketch(Plane(origin=(79.674337148, 0, 46), x_dir=(-0.4999999999999977, 0, 0.8660254037844399), z_dir=(-0.8660254037844399, 0, -0.4999999999999977)), mode=Mode.PRIVATE) as cortar_extruir19_sk1:
        Rectangle(CROQUIS56_W, CROQUIS56_H)
    cortar_extruir19_tool1 = extrude(cortar_extruir19_sk1.sketch, amount=CORTAR_EXTRUIR19_REACH, mode=Mode.PRIVATE) - cortar_extruir19_end
    add(cortar_extruir19_tool1.solids().sort_by_distance((79.674337, 0, 46))[0], mode=Mode.SUBTRACT)

    # Croquis69 → Saliente-Extruir35 (add)
    with BuildSketch(Plane(origin=(0, 12.5, 0), x_dir=(1, 0, 0), z_dir=(0, 1, 0))):
        with BuildLine():
            Line((23, -99.148648639), (23, -89.078616963))
            Line((23, -89.078616963), (34.15, -85.427030266))
            Line((34.15, -85.427030266), (34.15, -92.498648639))
            ThreePointArc((34.15, -92.498648639), (32.202260095, -97.200908734), (27.5, -99.148648639))
            Line((27.5, -99.148648639), (23, -99.148648639))
        make_face()
        with Locations(Location((27.5, -92.498648639, 0), (0, 0, 270))):
            Circle(CROQUIS69_R, mode=Mode.SUBTRACT)
    extrude(amount=-SALIENTE_EXTRUIR35_DEPTH)

    # Croquis71 → Saliente-Extruir37 (add)
    with BuildSketch(Plane(origin=(0, 12.5, 0), x_dir=(1, 0, 0), z_dir=(0, 1, 0))):
        with BuildLine():
            Line((-74.966599841, -102.204109388), (-77.966599841, -104.799777283))
            Line((-77.966599841, -104.799777283), (-77.966599841, -48.838604701))
            ThreePointArc((-77.966599841, -48.838604701), (-76.499557941, -51.105945201), (-74.966599841, -53.329250025))
            Line((-74.966599841, -53.329250025), (-74.966599841, -102.204109388))
        make_face()
    extrude(amount=-SALIENTE_EXTRUIR37_DEPTH)

    # Croquis72 → Saliente-Extruir38 (add)
    with BuildSketch(Plane(origin=(0, 12.5, 0), x_dir=(1, 0, 0), z_dir=(0, 1, 0))):
        with BuildLine():
            Line((-47.737994791, -78.645304077), (-74.966599841, -102.204109388))
            Line((-74.966599841, -102.204109388), (-74.966599841, -53.329250025))
            ThreePointArc((-74.966599841, -53.329250025), (-62.644473293, -67.377072998), (-47.737994791, -78.645304077))
        make_face()
    extrude(amount=-SALIENTE_EXTRUIR38_DEPTH)

    # Croquis73 → Saliente-Extruir39 (add)
    with BuildSketch(Plane.XZ.offset(15.5).offset(SALIENTE_EXTRUIR39_START)):
        with BuildLine():
            Line((-74.966599841, 102.204109388), (-74.966599841, 53.329250025))
            ThreePointArc((-74.966599841, 53.329250025), (-62.644473293, 67.377072998), (-47.737994791, 78.645304077))
            Line((-47.737994791, 78.645304077), (-74.966599841, 102.204109388))
        make_face()
    extrude(amount=SALIENTE_EXTRUIR39_DEPTH)

    # Croquis76 → Saliente-Extruir40 (add)
    with BuildSketch(Plane(origin=(0, 12.5, 0), x_dir=(1, 0, 0), z_dir=(0, 1, 0))):
        with BuildLine():
            Line((-71.316599841, -85.848648639), (-74.966599841, -85.848648639))
            Line((-74.966599841, -85.848648639), (-74.966599841, -102.204109388))
            Line((-74.966599841, -102.204109388), (-64.666599841, -93.292316285))
            Line((-64.666599841, -93.292316285), (-64.666599841, -92.498648639))
            ThreePointArc((-64.666599841, -92.498648639), (-66.614339746, -87.796388544), (-71.316599841, -85.848648639))
        make_face()
    extrude(amount=-SALIENTE_EXTRUIR40_DEPTH)

    # Croquis74 → Cortar-Extruir22 (cut, through all)
    with BuildSketch(Plane(origin=(0, 12.5, 0), x_dir=(1, 0, 0), z_dir=(0, 1, 0))):
        with Locations(Location((-71.316599841, -92.498648639, 0), (0, 0, 270))):
            Circle(CROQUIS74_R)
    extrude(amount=-CORTAR_EXTRUIR22_DEPTH, mode=Mode.SUBTRACT)

    # Croquis77 → Cortar-Extruir23 (cut)
    with BuildSketch(Plane.XZ.offset(15.5)):
        Polygon((25.479274058, 88.998648639), (29.520725942, 88.998648639), (31.541451884, 92.498648639), (29.520725942, 95.998648639), (25.479274058, 95.998648639), (23.458548116, 92.498648639), align=None)
        Polygon((-69.295873899, 88.998648639), (-67.275147957, 92.498648639), (-69.295873899, 95.998648639), (-73.337325783, 95.998648639), (-75.358051726, 92.498648639), (-73.337325783, 88.998648639), align=None)
    extrude(amount=-CORTAR_EXTRUIR23_DEPTH, mode=Mode.SUBTRACT)


with BuildPart() as body_7_2:
    # Croquis37 → Saliente-Extruir18 (new body)
    with BuildSketch(Plane.XZ.offset(15.5)):
        with Locations((-13.15, 30.15)):
            Circle(CROQUIS37_R)
        with Locations((-13.15, 30.15)):
            Circle(CROQUIS37_R_2, mode=Mode.SUBTRACT)
    extrude(amount=SALIENTE_EXTRUIR18_DEPTH)


with BuildPart() as body_8_2:
    # Simetría5: mirrored copy
    add(body_7_2.part.mirror(Plane(origin=(0, 0, 0), x_dir=(0, 0, 1), z_dir=(1, 0, 0))))


with BuildPart() as cortar_extruir14_piece_1:
    # of the separate pieces the step leaves, piece 1, a body of its own (cortar_extruir14_pieces)
    add(body_5.part.solids().sort_by_distance((3.5, -15.5, 68.141130502))[0])


with BuildPart() as cortar_extruir14_piece_2:
    # of the separate pieces the step leaves, piece 2, a body of its own (cortar_extruir14_pieces)
    add(body_5.part.solids().sort_by_distance((-3.5, -15.5, 68.291130502))[0])


with BuildPart() as body_10:
    # Croquis46 → Saliente-Extruir22 (new body)
    with BuildSketch(Plane.XZ.offset(15.5)):
        with BuildLine():
            Line((6.95, 30.15), (6.95, 24.15))
            Line((6.95, 24.15), (5.15, 24.15))
            Line((5.15, 24.15), (5.15, 30.15))
            ThreePointArc((5.15, 30.15), (13.15, 38.15), (21.15, 30.15))
            Line((21.15, 30.15), (21.15, 24.15))
            Line((21.15, 24.15), (19.35, 24.15))
            Line((19.35, 24.15), (19.35, 30.15))
            ThreePointArc((19.35, 30.15), (13.15, 36.35), (6.95, 30.15))
        make_face()
    extrude(amount=SALIENTE_EXTRUIR22_DEPTH)


with BuildPart() as body_11:
    # Croquis48 → Saliente-Extruir23 (new body)
    with BuildSketch(Plane.XZ.offset(18.8)):
        with BuildLine():
            Line((5.15, 30.15), (5.15, 24.15))
            Line((5.15, 24.15), (21.15, 24.15))
            Line((21.15, 24.15), (21.15, 30.15))
            ThreePointArc((21.15, 30.15), (13.15, 38.15), (5.15, 30.15))
        make_face()
    extrude(amount=SALIENTE_EXTRUIR23_DEPTH)

    # Croquis50 → Cortar-Extruir15 (cut)
    with BuildSketch(Plane.XZ.offset(23.8)):
        Polygon((15.170725942, 26.65), (17.191451884, 30.15), (15.170725942, 33.65), (11.129274058, 33.65), (9.108548116, 30.15), (11.129274058, 26.65), align=None)
    extrude(amount=-CORTAR_EXTRUIR15_DEPTH, mode=Mode.SUBTRACT)


with BuildPart() as body_12:
    # Simetría11 outline → Simetría11 (new body)
    with BuildSketch(Plane(origin=(0, 0, 0), x_dir=(1, 0, 0), z_dir=(0, 1, 0)).offset(SIMETR_A11_START)):
        with BuildLine():
            ThreePointArc((-6.95, -30.15), (-13.15, -36.35), (-19.35, -30.15))
            Line((-19.35, -30.15), (-19.35, -24.15))
            Line((-19.35, -24.15), (-21.15, -24.15))
            Line((-21.15, -24.15), (-21.15, -30.15))
            ThreePointArc((-21.15, -30.15), (-13.15, -38.15), (-5.15, -30.15))
            Line((-5.15, -30.15), (-5.15, -24.15))
            Line((-5.15, -24.15), (-6.95, -24.15))
            Line((-6.95, -24.15), (-6.95, -30.15))
        make_face()
    extrude(amount=SIMETR_A11_DEPTH)


with BuildPart() as body_13:
    # Simetr_a11 2 outline → Simetr_a11 2 (new body)
    with BuildSketch(Plane(origin=(0, 0, 0), x_dir=(1, 0, 0), z_dir=(0, 1, 0)).offset(SIMETR_A11_START_2)):
        with BuildLine():
            Line((-21.15, -24.15), (-21.15, -30.15))
            ThreePointArc((-21.15, -30.15), (-13.15, -38.15), (-5.15, -30.15))
            Line((-5.15, -30.15), (-5.15, -24.15))
            Line((-5.15, -24.15), (-21.15, -24.15))
        make_face()
        Polygon((-15.170725942, -26.65), (-11.129274058, -26.65), (-9.108548116, -30.15), (-11.129274058, -33.65), (-15.170725942, -33.65), (-17.191451884, -30.15), align=None, mode=Mode.SUBTRACT)
    extrude(amount=SIMETR_A11_2_DEPTH)

    # Simetr_a11 3 outline → Simetr_a11 3 (add)
    with BuildSketch(Plane(origin=(0, 0, 0), x_dir=(1, 0, 0), z_dir=(0, 1, 0)).offset(SIMETR_A11_START_3)):
        Polygon((-9.108548116, -30.15), (-11.129274058, -26.65), (-15.170725942, -26.65), (-17.191451884, -30.15), (-15.170725942, -33.65), (-11.129274058, -33.65), align=None)
    extrude(amount=SIMETR_A11_3_DEPTH)


with BuildPart() as body_14:
    # Croquis51 → Saliente-Extruir24 (new body)
    with BuildSketch(Plane.XZ.offset(15.5)):
        with BuildLine():
            Line((3.5, 68.107601731), (3.5, 65.97078039))
            ThreePointArc((3.5, 65.97078039), (0, 81.164527675), (-3.5, 65.97078039))
            Line((-3.5, 65.97078039), (-3.5, 68.107601731))
            ThreePointArc((-3.5, 68.107601731), (0, 79.314527675), (3.5, 68.107601731))
        make_face()
    extrude(amount=SALIENTE_EXTRUIR24_DEPTH)


with BuildPart() as body_15:
    # Croquis53 → Saliente-Extruir25 (new body)
    with BuildSketch(Plane.XZ.offset(18.8)):
        with Locations((0, 73.164527675)):
            Circle(CROQUIS53_R)
    extrude(amount=SALIENTE_EXTRUIR25_DEPTH)

    # Croquis54 → Cortar-Extruir16 (cut)
    with BuildSketch(Plane.XZ.offset(23.8)):
        Polygon((2.020725942, 69.664527675), (4.041451884, 73.164527675), (2.020725942, 76.664527675), (-2.020725942, 76.664527675), (-4.041451884, 73.164527675), (-2.020725942, 69.664527675), align=None)
    extrude(amount=-CORTAR_EXTRUIR16_DEPTH, mode=Mode.SUBTRACT)


with BuildPart() as cortar_extruir18_tool:
    # Croquis55 → Cortar-Extruir18 (new, through all)
    with BuildSketch(Plane.XZ.offset(15.5)):
        with Locations(Location((13.15, 30.15, 0), (0, 0, 180))):
            Circle(CROQUIS55_R)
        with Locations((0, 73.164527675)):
            Circle(CROQUIS55_R)
        with Locations((-13.15, 30.15)):
            Circle(CROQUIS55_R)
    extrude(amount=CORTAR_EXTRUIR18_DEPTH)


with BuildPart() as body_11_1:
    add(body_11.part)

    # Cortar-Extruir18: cut by cortar_extruir18_tool
    add(cortar_extruir18_tool.part, mode=Mode.SUBTRACT)


with BuildPart() as body_13_1:
    add(body_13.part)

    # Cortar-Extruir18: cut by cortar_extruir18_tool
    add(cortar_extruir18_tool.part, mode=Mode.SUBTRACT)


with BuildPart() as body_15_1:
    add(body_15.part)

    # Cortar-Extruir18: cut by cortar_extruir18_tool
    add(cortar_extruir18_tool.part, mode=Mode.SUBTRACT)


with BuildPart() as body_5_2:
    # Croquis79 → Saliente-Extruir41 (new body)
    with BuildSketch(Plane.XZ.offset(15.5)):
        with BuildLine():
            Line((34.15, 85.427030266), (34.15, 92.498648639))
            ThreePointArc((34.15, 92.498648639), (32.202260095, 97.200908734), (27.5, 99.148648639))
            Line((27.5, 99.148648639), (23, 99.148648639))
            Line((23, 99.148648639), (23, 106.428644381))
            Line((23, 106.428644381), (-24.458364465, 137.248466626))
            Line((-24.458364465, 137.248466626), (-77.966599841, 137.248466626))
            Line((-77.966599841, 137.248466626), (-77.966599841, 48.838604701))
            ThreePointArc((-77.966599841, 48.838604701), (-86.951545733, -30.057090587), (-31.161904883, -86.561744923))
            Line((-31.161904883, -86.561744923), (-31.161904883, -93.338095117))
            ThreePointArc((-31.161904883, -93.338095117), (-29.210678119, -98.048773235), (-24.5, -100))
            Line((-24.5, -100), (24.5, -100))
            ThreePointArc((24.5, -100), (29.210678119, -98.048773235), (31.161904883, -93.338095117))
            Line((31.161904883, -93.338095117), (31.161904883, -86.561744923))
            ThreePointArc((31.161904883, -86.561744923), (91.986118124, -1.598146565), (34.15, 85.427030266))
        make_face()
        with Locations((24.5, -93.338095117)):
            Circle(CROQUIS79_R, mode=Mode.SUBTRACT)
        with Locations((-24.5, -93.338095117)):
            Circle(CROQUIS79_R, mode=Mode.SUBTRACT)
        with Locations((27.5, 92.498648639)):
            Circle(CROQUIS79_R, mode=Mode.SUBTRACT)
        with Locations((-71.316599841, 92.498648639)):
            Circle(CROQUIS79_R, mode=Mode.SUBTRACT)
    extrude(amount=-SALIENTE_EXTRUIR41_DEPTH)

    # Croquis81 → Saliente-Extruir43 (add)
    with BuildSketch(Plane(origin=(0, -13.5, 0), x_dir=(1, 0, 0), z_dir=(0, 1, 0))):
        with Locations((-52.466599841, -122.248466626)):
            Circle(CROQUIS81_R)
    extrude(amount=SALIENTE_EXTRUIR43_DEPTH)

    # Croquis82 → Cortar-Extruir24 (cut)
    with BuildSketch(Plane(origin=(0, -13.5, 0), x_dir=(1, 0, 0), z_dir=(0, 1, 0))):
        with Locations(Location((0, 0, 0), (0, 0, 180))):
            Circle(CROQUIS82_R)
    extrude(amount=-CORTAR_EXTRUIR24_DEPTH, mode=Mode.SUBTRACT)


solid = body_5_2.part
